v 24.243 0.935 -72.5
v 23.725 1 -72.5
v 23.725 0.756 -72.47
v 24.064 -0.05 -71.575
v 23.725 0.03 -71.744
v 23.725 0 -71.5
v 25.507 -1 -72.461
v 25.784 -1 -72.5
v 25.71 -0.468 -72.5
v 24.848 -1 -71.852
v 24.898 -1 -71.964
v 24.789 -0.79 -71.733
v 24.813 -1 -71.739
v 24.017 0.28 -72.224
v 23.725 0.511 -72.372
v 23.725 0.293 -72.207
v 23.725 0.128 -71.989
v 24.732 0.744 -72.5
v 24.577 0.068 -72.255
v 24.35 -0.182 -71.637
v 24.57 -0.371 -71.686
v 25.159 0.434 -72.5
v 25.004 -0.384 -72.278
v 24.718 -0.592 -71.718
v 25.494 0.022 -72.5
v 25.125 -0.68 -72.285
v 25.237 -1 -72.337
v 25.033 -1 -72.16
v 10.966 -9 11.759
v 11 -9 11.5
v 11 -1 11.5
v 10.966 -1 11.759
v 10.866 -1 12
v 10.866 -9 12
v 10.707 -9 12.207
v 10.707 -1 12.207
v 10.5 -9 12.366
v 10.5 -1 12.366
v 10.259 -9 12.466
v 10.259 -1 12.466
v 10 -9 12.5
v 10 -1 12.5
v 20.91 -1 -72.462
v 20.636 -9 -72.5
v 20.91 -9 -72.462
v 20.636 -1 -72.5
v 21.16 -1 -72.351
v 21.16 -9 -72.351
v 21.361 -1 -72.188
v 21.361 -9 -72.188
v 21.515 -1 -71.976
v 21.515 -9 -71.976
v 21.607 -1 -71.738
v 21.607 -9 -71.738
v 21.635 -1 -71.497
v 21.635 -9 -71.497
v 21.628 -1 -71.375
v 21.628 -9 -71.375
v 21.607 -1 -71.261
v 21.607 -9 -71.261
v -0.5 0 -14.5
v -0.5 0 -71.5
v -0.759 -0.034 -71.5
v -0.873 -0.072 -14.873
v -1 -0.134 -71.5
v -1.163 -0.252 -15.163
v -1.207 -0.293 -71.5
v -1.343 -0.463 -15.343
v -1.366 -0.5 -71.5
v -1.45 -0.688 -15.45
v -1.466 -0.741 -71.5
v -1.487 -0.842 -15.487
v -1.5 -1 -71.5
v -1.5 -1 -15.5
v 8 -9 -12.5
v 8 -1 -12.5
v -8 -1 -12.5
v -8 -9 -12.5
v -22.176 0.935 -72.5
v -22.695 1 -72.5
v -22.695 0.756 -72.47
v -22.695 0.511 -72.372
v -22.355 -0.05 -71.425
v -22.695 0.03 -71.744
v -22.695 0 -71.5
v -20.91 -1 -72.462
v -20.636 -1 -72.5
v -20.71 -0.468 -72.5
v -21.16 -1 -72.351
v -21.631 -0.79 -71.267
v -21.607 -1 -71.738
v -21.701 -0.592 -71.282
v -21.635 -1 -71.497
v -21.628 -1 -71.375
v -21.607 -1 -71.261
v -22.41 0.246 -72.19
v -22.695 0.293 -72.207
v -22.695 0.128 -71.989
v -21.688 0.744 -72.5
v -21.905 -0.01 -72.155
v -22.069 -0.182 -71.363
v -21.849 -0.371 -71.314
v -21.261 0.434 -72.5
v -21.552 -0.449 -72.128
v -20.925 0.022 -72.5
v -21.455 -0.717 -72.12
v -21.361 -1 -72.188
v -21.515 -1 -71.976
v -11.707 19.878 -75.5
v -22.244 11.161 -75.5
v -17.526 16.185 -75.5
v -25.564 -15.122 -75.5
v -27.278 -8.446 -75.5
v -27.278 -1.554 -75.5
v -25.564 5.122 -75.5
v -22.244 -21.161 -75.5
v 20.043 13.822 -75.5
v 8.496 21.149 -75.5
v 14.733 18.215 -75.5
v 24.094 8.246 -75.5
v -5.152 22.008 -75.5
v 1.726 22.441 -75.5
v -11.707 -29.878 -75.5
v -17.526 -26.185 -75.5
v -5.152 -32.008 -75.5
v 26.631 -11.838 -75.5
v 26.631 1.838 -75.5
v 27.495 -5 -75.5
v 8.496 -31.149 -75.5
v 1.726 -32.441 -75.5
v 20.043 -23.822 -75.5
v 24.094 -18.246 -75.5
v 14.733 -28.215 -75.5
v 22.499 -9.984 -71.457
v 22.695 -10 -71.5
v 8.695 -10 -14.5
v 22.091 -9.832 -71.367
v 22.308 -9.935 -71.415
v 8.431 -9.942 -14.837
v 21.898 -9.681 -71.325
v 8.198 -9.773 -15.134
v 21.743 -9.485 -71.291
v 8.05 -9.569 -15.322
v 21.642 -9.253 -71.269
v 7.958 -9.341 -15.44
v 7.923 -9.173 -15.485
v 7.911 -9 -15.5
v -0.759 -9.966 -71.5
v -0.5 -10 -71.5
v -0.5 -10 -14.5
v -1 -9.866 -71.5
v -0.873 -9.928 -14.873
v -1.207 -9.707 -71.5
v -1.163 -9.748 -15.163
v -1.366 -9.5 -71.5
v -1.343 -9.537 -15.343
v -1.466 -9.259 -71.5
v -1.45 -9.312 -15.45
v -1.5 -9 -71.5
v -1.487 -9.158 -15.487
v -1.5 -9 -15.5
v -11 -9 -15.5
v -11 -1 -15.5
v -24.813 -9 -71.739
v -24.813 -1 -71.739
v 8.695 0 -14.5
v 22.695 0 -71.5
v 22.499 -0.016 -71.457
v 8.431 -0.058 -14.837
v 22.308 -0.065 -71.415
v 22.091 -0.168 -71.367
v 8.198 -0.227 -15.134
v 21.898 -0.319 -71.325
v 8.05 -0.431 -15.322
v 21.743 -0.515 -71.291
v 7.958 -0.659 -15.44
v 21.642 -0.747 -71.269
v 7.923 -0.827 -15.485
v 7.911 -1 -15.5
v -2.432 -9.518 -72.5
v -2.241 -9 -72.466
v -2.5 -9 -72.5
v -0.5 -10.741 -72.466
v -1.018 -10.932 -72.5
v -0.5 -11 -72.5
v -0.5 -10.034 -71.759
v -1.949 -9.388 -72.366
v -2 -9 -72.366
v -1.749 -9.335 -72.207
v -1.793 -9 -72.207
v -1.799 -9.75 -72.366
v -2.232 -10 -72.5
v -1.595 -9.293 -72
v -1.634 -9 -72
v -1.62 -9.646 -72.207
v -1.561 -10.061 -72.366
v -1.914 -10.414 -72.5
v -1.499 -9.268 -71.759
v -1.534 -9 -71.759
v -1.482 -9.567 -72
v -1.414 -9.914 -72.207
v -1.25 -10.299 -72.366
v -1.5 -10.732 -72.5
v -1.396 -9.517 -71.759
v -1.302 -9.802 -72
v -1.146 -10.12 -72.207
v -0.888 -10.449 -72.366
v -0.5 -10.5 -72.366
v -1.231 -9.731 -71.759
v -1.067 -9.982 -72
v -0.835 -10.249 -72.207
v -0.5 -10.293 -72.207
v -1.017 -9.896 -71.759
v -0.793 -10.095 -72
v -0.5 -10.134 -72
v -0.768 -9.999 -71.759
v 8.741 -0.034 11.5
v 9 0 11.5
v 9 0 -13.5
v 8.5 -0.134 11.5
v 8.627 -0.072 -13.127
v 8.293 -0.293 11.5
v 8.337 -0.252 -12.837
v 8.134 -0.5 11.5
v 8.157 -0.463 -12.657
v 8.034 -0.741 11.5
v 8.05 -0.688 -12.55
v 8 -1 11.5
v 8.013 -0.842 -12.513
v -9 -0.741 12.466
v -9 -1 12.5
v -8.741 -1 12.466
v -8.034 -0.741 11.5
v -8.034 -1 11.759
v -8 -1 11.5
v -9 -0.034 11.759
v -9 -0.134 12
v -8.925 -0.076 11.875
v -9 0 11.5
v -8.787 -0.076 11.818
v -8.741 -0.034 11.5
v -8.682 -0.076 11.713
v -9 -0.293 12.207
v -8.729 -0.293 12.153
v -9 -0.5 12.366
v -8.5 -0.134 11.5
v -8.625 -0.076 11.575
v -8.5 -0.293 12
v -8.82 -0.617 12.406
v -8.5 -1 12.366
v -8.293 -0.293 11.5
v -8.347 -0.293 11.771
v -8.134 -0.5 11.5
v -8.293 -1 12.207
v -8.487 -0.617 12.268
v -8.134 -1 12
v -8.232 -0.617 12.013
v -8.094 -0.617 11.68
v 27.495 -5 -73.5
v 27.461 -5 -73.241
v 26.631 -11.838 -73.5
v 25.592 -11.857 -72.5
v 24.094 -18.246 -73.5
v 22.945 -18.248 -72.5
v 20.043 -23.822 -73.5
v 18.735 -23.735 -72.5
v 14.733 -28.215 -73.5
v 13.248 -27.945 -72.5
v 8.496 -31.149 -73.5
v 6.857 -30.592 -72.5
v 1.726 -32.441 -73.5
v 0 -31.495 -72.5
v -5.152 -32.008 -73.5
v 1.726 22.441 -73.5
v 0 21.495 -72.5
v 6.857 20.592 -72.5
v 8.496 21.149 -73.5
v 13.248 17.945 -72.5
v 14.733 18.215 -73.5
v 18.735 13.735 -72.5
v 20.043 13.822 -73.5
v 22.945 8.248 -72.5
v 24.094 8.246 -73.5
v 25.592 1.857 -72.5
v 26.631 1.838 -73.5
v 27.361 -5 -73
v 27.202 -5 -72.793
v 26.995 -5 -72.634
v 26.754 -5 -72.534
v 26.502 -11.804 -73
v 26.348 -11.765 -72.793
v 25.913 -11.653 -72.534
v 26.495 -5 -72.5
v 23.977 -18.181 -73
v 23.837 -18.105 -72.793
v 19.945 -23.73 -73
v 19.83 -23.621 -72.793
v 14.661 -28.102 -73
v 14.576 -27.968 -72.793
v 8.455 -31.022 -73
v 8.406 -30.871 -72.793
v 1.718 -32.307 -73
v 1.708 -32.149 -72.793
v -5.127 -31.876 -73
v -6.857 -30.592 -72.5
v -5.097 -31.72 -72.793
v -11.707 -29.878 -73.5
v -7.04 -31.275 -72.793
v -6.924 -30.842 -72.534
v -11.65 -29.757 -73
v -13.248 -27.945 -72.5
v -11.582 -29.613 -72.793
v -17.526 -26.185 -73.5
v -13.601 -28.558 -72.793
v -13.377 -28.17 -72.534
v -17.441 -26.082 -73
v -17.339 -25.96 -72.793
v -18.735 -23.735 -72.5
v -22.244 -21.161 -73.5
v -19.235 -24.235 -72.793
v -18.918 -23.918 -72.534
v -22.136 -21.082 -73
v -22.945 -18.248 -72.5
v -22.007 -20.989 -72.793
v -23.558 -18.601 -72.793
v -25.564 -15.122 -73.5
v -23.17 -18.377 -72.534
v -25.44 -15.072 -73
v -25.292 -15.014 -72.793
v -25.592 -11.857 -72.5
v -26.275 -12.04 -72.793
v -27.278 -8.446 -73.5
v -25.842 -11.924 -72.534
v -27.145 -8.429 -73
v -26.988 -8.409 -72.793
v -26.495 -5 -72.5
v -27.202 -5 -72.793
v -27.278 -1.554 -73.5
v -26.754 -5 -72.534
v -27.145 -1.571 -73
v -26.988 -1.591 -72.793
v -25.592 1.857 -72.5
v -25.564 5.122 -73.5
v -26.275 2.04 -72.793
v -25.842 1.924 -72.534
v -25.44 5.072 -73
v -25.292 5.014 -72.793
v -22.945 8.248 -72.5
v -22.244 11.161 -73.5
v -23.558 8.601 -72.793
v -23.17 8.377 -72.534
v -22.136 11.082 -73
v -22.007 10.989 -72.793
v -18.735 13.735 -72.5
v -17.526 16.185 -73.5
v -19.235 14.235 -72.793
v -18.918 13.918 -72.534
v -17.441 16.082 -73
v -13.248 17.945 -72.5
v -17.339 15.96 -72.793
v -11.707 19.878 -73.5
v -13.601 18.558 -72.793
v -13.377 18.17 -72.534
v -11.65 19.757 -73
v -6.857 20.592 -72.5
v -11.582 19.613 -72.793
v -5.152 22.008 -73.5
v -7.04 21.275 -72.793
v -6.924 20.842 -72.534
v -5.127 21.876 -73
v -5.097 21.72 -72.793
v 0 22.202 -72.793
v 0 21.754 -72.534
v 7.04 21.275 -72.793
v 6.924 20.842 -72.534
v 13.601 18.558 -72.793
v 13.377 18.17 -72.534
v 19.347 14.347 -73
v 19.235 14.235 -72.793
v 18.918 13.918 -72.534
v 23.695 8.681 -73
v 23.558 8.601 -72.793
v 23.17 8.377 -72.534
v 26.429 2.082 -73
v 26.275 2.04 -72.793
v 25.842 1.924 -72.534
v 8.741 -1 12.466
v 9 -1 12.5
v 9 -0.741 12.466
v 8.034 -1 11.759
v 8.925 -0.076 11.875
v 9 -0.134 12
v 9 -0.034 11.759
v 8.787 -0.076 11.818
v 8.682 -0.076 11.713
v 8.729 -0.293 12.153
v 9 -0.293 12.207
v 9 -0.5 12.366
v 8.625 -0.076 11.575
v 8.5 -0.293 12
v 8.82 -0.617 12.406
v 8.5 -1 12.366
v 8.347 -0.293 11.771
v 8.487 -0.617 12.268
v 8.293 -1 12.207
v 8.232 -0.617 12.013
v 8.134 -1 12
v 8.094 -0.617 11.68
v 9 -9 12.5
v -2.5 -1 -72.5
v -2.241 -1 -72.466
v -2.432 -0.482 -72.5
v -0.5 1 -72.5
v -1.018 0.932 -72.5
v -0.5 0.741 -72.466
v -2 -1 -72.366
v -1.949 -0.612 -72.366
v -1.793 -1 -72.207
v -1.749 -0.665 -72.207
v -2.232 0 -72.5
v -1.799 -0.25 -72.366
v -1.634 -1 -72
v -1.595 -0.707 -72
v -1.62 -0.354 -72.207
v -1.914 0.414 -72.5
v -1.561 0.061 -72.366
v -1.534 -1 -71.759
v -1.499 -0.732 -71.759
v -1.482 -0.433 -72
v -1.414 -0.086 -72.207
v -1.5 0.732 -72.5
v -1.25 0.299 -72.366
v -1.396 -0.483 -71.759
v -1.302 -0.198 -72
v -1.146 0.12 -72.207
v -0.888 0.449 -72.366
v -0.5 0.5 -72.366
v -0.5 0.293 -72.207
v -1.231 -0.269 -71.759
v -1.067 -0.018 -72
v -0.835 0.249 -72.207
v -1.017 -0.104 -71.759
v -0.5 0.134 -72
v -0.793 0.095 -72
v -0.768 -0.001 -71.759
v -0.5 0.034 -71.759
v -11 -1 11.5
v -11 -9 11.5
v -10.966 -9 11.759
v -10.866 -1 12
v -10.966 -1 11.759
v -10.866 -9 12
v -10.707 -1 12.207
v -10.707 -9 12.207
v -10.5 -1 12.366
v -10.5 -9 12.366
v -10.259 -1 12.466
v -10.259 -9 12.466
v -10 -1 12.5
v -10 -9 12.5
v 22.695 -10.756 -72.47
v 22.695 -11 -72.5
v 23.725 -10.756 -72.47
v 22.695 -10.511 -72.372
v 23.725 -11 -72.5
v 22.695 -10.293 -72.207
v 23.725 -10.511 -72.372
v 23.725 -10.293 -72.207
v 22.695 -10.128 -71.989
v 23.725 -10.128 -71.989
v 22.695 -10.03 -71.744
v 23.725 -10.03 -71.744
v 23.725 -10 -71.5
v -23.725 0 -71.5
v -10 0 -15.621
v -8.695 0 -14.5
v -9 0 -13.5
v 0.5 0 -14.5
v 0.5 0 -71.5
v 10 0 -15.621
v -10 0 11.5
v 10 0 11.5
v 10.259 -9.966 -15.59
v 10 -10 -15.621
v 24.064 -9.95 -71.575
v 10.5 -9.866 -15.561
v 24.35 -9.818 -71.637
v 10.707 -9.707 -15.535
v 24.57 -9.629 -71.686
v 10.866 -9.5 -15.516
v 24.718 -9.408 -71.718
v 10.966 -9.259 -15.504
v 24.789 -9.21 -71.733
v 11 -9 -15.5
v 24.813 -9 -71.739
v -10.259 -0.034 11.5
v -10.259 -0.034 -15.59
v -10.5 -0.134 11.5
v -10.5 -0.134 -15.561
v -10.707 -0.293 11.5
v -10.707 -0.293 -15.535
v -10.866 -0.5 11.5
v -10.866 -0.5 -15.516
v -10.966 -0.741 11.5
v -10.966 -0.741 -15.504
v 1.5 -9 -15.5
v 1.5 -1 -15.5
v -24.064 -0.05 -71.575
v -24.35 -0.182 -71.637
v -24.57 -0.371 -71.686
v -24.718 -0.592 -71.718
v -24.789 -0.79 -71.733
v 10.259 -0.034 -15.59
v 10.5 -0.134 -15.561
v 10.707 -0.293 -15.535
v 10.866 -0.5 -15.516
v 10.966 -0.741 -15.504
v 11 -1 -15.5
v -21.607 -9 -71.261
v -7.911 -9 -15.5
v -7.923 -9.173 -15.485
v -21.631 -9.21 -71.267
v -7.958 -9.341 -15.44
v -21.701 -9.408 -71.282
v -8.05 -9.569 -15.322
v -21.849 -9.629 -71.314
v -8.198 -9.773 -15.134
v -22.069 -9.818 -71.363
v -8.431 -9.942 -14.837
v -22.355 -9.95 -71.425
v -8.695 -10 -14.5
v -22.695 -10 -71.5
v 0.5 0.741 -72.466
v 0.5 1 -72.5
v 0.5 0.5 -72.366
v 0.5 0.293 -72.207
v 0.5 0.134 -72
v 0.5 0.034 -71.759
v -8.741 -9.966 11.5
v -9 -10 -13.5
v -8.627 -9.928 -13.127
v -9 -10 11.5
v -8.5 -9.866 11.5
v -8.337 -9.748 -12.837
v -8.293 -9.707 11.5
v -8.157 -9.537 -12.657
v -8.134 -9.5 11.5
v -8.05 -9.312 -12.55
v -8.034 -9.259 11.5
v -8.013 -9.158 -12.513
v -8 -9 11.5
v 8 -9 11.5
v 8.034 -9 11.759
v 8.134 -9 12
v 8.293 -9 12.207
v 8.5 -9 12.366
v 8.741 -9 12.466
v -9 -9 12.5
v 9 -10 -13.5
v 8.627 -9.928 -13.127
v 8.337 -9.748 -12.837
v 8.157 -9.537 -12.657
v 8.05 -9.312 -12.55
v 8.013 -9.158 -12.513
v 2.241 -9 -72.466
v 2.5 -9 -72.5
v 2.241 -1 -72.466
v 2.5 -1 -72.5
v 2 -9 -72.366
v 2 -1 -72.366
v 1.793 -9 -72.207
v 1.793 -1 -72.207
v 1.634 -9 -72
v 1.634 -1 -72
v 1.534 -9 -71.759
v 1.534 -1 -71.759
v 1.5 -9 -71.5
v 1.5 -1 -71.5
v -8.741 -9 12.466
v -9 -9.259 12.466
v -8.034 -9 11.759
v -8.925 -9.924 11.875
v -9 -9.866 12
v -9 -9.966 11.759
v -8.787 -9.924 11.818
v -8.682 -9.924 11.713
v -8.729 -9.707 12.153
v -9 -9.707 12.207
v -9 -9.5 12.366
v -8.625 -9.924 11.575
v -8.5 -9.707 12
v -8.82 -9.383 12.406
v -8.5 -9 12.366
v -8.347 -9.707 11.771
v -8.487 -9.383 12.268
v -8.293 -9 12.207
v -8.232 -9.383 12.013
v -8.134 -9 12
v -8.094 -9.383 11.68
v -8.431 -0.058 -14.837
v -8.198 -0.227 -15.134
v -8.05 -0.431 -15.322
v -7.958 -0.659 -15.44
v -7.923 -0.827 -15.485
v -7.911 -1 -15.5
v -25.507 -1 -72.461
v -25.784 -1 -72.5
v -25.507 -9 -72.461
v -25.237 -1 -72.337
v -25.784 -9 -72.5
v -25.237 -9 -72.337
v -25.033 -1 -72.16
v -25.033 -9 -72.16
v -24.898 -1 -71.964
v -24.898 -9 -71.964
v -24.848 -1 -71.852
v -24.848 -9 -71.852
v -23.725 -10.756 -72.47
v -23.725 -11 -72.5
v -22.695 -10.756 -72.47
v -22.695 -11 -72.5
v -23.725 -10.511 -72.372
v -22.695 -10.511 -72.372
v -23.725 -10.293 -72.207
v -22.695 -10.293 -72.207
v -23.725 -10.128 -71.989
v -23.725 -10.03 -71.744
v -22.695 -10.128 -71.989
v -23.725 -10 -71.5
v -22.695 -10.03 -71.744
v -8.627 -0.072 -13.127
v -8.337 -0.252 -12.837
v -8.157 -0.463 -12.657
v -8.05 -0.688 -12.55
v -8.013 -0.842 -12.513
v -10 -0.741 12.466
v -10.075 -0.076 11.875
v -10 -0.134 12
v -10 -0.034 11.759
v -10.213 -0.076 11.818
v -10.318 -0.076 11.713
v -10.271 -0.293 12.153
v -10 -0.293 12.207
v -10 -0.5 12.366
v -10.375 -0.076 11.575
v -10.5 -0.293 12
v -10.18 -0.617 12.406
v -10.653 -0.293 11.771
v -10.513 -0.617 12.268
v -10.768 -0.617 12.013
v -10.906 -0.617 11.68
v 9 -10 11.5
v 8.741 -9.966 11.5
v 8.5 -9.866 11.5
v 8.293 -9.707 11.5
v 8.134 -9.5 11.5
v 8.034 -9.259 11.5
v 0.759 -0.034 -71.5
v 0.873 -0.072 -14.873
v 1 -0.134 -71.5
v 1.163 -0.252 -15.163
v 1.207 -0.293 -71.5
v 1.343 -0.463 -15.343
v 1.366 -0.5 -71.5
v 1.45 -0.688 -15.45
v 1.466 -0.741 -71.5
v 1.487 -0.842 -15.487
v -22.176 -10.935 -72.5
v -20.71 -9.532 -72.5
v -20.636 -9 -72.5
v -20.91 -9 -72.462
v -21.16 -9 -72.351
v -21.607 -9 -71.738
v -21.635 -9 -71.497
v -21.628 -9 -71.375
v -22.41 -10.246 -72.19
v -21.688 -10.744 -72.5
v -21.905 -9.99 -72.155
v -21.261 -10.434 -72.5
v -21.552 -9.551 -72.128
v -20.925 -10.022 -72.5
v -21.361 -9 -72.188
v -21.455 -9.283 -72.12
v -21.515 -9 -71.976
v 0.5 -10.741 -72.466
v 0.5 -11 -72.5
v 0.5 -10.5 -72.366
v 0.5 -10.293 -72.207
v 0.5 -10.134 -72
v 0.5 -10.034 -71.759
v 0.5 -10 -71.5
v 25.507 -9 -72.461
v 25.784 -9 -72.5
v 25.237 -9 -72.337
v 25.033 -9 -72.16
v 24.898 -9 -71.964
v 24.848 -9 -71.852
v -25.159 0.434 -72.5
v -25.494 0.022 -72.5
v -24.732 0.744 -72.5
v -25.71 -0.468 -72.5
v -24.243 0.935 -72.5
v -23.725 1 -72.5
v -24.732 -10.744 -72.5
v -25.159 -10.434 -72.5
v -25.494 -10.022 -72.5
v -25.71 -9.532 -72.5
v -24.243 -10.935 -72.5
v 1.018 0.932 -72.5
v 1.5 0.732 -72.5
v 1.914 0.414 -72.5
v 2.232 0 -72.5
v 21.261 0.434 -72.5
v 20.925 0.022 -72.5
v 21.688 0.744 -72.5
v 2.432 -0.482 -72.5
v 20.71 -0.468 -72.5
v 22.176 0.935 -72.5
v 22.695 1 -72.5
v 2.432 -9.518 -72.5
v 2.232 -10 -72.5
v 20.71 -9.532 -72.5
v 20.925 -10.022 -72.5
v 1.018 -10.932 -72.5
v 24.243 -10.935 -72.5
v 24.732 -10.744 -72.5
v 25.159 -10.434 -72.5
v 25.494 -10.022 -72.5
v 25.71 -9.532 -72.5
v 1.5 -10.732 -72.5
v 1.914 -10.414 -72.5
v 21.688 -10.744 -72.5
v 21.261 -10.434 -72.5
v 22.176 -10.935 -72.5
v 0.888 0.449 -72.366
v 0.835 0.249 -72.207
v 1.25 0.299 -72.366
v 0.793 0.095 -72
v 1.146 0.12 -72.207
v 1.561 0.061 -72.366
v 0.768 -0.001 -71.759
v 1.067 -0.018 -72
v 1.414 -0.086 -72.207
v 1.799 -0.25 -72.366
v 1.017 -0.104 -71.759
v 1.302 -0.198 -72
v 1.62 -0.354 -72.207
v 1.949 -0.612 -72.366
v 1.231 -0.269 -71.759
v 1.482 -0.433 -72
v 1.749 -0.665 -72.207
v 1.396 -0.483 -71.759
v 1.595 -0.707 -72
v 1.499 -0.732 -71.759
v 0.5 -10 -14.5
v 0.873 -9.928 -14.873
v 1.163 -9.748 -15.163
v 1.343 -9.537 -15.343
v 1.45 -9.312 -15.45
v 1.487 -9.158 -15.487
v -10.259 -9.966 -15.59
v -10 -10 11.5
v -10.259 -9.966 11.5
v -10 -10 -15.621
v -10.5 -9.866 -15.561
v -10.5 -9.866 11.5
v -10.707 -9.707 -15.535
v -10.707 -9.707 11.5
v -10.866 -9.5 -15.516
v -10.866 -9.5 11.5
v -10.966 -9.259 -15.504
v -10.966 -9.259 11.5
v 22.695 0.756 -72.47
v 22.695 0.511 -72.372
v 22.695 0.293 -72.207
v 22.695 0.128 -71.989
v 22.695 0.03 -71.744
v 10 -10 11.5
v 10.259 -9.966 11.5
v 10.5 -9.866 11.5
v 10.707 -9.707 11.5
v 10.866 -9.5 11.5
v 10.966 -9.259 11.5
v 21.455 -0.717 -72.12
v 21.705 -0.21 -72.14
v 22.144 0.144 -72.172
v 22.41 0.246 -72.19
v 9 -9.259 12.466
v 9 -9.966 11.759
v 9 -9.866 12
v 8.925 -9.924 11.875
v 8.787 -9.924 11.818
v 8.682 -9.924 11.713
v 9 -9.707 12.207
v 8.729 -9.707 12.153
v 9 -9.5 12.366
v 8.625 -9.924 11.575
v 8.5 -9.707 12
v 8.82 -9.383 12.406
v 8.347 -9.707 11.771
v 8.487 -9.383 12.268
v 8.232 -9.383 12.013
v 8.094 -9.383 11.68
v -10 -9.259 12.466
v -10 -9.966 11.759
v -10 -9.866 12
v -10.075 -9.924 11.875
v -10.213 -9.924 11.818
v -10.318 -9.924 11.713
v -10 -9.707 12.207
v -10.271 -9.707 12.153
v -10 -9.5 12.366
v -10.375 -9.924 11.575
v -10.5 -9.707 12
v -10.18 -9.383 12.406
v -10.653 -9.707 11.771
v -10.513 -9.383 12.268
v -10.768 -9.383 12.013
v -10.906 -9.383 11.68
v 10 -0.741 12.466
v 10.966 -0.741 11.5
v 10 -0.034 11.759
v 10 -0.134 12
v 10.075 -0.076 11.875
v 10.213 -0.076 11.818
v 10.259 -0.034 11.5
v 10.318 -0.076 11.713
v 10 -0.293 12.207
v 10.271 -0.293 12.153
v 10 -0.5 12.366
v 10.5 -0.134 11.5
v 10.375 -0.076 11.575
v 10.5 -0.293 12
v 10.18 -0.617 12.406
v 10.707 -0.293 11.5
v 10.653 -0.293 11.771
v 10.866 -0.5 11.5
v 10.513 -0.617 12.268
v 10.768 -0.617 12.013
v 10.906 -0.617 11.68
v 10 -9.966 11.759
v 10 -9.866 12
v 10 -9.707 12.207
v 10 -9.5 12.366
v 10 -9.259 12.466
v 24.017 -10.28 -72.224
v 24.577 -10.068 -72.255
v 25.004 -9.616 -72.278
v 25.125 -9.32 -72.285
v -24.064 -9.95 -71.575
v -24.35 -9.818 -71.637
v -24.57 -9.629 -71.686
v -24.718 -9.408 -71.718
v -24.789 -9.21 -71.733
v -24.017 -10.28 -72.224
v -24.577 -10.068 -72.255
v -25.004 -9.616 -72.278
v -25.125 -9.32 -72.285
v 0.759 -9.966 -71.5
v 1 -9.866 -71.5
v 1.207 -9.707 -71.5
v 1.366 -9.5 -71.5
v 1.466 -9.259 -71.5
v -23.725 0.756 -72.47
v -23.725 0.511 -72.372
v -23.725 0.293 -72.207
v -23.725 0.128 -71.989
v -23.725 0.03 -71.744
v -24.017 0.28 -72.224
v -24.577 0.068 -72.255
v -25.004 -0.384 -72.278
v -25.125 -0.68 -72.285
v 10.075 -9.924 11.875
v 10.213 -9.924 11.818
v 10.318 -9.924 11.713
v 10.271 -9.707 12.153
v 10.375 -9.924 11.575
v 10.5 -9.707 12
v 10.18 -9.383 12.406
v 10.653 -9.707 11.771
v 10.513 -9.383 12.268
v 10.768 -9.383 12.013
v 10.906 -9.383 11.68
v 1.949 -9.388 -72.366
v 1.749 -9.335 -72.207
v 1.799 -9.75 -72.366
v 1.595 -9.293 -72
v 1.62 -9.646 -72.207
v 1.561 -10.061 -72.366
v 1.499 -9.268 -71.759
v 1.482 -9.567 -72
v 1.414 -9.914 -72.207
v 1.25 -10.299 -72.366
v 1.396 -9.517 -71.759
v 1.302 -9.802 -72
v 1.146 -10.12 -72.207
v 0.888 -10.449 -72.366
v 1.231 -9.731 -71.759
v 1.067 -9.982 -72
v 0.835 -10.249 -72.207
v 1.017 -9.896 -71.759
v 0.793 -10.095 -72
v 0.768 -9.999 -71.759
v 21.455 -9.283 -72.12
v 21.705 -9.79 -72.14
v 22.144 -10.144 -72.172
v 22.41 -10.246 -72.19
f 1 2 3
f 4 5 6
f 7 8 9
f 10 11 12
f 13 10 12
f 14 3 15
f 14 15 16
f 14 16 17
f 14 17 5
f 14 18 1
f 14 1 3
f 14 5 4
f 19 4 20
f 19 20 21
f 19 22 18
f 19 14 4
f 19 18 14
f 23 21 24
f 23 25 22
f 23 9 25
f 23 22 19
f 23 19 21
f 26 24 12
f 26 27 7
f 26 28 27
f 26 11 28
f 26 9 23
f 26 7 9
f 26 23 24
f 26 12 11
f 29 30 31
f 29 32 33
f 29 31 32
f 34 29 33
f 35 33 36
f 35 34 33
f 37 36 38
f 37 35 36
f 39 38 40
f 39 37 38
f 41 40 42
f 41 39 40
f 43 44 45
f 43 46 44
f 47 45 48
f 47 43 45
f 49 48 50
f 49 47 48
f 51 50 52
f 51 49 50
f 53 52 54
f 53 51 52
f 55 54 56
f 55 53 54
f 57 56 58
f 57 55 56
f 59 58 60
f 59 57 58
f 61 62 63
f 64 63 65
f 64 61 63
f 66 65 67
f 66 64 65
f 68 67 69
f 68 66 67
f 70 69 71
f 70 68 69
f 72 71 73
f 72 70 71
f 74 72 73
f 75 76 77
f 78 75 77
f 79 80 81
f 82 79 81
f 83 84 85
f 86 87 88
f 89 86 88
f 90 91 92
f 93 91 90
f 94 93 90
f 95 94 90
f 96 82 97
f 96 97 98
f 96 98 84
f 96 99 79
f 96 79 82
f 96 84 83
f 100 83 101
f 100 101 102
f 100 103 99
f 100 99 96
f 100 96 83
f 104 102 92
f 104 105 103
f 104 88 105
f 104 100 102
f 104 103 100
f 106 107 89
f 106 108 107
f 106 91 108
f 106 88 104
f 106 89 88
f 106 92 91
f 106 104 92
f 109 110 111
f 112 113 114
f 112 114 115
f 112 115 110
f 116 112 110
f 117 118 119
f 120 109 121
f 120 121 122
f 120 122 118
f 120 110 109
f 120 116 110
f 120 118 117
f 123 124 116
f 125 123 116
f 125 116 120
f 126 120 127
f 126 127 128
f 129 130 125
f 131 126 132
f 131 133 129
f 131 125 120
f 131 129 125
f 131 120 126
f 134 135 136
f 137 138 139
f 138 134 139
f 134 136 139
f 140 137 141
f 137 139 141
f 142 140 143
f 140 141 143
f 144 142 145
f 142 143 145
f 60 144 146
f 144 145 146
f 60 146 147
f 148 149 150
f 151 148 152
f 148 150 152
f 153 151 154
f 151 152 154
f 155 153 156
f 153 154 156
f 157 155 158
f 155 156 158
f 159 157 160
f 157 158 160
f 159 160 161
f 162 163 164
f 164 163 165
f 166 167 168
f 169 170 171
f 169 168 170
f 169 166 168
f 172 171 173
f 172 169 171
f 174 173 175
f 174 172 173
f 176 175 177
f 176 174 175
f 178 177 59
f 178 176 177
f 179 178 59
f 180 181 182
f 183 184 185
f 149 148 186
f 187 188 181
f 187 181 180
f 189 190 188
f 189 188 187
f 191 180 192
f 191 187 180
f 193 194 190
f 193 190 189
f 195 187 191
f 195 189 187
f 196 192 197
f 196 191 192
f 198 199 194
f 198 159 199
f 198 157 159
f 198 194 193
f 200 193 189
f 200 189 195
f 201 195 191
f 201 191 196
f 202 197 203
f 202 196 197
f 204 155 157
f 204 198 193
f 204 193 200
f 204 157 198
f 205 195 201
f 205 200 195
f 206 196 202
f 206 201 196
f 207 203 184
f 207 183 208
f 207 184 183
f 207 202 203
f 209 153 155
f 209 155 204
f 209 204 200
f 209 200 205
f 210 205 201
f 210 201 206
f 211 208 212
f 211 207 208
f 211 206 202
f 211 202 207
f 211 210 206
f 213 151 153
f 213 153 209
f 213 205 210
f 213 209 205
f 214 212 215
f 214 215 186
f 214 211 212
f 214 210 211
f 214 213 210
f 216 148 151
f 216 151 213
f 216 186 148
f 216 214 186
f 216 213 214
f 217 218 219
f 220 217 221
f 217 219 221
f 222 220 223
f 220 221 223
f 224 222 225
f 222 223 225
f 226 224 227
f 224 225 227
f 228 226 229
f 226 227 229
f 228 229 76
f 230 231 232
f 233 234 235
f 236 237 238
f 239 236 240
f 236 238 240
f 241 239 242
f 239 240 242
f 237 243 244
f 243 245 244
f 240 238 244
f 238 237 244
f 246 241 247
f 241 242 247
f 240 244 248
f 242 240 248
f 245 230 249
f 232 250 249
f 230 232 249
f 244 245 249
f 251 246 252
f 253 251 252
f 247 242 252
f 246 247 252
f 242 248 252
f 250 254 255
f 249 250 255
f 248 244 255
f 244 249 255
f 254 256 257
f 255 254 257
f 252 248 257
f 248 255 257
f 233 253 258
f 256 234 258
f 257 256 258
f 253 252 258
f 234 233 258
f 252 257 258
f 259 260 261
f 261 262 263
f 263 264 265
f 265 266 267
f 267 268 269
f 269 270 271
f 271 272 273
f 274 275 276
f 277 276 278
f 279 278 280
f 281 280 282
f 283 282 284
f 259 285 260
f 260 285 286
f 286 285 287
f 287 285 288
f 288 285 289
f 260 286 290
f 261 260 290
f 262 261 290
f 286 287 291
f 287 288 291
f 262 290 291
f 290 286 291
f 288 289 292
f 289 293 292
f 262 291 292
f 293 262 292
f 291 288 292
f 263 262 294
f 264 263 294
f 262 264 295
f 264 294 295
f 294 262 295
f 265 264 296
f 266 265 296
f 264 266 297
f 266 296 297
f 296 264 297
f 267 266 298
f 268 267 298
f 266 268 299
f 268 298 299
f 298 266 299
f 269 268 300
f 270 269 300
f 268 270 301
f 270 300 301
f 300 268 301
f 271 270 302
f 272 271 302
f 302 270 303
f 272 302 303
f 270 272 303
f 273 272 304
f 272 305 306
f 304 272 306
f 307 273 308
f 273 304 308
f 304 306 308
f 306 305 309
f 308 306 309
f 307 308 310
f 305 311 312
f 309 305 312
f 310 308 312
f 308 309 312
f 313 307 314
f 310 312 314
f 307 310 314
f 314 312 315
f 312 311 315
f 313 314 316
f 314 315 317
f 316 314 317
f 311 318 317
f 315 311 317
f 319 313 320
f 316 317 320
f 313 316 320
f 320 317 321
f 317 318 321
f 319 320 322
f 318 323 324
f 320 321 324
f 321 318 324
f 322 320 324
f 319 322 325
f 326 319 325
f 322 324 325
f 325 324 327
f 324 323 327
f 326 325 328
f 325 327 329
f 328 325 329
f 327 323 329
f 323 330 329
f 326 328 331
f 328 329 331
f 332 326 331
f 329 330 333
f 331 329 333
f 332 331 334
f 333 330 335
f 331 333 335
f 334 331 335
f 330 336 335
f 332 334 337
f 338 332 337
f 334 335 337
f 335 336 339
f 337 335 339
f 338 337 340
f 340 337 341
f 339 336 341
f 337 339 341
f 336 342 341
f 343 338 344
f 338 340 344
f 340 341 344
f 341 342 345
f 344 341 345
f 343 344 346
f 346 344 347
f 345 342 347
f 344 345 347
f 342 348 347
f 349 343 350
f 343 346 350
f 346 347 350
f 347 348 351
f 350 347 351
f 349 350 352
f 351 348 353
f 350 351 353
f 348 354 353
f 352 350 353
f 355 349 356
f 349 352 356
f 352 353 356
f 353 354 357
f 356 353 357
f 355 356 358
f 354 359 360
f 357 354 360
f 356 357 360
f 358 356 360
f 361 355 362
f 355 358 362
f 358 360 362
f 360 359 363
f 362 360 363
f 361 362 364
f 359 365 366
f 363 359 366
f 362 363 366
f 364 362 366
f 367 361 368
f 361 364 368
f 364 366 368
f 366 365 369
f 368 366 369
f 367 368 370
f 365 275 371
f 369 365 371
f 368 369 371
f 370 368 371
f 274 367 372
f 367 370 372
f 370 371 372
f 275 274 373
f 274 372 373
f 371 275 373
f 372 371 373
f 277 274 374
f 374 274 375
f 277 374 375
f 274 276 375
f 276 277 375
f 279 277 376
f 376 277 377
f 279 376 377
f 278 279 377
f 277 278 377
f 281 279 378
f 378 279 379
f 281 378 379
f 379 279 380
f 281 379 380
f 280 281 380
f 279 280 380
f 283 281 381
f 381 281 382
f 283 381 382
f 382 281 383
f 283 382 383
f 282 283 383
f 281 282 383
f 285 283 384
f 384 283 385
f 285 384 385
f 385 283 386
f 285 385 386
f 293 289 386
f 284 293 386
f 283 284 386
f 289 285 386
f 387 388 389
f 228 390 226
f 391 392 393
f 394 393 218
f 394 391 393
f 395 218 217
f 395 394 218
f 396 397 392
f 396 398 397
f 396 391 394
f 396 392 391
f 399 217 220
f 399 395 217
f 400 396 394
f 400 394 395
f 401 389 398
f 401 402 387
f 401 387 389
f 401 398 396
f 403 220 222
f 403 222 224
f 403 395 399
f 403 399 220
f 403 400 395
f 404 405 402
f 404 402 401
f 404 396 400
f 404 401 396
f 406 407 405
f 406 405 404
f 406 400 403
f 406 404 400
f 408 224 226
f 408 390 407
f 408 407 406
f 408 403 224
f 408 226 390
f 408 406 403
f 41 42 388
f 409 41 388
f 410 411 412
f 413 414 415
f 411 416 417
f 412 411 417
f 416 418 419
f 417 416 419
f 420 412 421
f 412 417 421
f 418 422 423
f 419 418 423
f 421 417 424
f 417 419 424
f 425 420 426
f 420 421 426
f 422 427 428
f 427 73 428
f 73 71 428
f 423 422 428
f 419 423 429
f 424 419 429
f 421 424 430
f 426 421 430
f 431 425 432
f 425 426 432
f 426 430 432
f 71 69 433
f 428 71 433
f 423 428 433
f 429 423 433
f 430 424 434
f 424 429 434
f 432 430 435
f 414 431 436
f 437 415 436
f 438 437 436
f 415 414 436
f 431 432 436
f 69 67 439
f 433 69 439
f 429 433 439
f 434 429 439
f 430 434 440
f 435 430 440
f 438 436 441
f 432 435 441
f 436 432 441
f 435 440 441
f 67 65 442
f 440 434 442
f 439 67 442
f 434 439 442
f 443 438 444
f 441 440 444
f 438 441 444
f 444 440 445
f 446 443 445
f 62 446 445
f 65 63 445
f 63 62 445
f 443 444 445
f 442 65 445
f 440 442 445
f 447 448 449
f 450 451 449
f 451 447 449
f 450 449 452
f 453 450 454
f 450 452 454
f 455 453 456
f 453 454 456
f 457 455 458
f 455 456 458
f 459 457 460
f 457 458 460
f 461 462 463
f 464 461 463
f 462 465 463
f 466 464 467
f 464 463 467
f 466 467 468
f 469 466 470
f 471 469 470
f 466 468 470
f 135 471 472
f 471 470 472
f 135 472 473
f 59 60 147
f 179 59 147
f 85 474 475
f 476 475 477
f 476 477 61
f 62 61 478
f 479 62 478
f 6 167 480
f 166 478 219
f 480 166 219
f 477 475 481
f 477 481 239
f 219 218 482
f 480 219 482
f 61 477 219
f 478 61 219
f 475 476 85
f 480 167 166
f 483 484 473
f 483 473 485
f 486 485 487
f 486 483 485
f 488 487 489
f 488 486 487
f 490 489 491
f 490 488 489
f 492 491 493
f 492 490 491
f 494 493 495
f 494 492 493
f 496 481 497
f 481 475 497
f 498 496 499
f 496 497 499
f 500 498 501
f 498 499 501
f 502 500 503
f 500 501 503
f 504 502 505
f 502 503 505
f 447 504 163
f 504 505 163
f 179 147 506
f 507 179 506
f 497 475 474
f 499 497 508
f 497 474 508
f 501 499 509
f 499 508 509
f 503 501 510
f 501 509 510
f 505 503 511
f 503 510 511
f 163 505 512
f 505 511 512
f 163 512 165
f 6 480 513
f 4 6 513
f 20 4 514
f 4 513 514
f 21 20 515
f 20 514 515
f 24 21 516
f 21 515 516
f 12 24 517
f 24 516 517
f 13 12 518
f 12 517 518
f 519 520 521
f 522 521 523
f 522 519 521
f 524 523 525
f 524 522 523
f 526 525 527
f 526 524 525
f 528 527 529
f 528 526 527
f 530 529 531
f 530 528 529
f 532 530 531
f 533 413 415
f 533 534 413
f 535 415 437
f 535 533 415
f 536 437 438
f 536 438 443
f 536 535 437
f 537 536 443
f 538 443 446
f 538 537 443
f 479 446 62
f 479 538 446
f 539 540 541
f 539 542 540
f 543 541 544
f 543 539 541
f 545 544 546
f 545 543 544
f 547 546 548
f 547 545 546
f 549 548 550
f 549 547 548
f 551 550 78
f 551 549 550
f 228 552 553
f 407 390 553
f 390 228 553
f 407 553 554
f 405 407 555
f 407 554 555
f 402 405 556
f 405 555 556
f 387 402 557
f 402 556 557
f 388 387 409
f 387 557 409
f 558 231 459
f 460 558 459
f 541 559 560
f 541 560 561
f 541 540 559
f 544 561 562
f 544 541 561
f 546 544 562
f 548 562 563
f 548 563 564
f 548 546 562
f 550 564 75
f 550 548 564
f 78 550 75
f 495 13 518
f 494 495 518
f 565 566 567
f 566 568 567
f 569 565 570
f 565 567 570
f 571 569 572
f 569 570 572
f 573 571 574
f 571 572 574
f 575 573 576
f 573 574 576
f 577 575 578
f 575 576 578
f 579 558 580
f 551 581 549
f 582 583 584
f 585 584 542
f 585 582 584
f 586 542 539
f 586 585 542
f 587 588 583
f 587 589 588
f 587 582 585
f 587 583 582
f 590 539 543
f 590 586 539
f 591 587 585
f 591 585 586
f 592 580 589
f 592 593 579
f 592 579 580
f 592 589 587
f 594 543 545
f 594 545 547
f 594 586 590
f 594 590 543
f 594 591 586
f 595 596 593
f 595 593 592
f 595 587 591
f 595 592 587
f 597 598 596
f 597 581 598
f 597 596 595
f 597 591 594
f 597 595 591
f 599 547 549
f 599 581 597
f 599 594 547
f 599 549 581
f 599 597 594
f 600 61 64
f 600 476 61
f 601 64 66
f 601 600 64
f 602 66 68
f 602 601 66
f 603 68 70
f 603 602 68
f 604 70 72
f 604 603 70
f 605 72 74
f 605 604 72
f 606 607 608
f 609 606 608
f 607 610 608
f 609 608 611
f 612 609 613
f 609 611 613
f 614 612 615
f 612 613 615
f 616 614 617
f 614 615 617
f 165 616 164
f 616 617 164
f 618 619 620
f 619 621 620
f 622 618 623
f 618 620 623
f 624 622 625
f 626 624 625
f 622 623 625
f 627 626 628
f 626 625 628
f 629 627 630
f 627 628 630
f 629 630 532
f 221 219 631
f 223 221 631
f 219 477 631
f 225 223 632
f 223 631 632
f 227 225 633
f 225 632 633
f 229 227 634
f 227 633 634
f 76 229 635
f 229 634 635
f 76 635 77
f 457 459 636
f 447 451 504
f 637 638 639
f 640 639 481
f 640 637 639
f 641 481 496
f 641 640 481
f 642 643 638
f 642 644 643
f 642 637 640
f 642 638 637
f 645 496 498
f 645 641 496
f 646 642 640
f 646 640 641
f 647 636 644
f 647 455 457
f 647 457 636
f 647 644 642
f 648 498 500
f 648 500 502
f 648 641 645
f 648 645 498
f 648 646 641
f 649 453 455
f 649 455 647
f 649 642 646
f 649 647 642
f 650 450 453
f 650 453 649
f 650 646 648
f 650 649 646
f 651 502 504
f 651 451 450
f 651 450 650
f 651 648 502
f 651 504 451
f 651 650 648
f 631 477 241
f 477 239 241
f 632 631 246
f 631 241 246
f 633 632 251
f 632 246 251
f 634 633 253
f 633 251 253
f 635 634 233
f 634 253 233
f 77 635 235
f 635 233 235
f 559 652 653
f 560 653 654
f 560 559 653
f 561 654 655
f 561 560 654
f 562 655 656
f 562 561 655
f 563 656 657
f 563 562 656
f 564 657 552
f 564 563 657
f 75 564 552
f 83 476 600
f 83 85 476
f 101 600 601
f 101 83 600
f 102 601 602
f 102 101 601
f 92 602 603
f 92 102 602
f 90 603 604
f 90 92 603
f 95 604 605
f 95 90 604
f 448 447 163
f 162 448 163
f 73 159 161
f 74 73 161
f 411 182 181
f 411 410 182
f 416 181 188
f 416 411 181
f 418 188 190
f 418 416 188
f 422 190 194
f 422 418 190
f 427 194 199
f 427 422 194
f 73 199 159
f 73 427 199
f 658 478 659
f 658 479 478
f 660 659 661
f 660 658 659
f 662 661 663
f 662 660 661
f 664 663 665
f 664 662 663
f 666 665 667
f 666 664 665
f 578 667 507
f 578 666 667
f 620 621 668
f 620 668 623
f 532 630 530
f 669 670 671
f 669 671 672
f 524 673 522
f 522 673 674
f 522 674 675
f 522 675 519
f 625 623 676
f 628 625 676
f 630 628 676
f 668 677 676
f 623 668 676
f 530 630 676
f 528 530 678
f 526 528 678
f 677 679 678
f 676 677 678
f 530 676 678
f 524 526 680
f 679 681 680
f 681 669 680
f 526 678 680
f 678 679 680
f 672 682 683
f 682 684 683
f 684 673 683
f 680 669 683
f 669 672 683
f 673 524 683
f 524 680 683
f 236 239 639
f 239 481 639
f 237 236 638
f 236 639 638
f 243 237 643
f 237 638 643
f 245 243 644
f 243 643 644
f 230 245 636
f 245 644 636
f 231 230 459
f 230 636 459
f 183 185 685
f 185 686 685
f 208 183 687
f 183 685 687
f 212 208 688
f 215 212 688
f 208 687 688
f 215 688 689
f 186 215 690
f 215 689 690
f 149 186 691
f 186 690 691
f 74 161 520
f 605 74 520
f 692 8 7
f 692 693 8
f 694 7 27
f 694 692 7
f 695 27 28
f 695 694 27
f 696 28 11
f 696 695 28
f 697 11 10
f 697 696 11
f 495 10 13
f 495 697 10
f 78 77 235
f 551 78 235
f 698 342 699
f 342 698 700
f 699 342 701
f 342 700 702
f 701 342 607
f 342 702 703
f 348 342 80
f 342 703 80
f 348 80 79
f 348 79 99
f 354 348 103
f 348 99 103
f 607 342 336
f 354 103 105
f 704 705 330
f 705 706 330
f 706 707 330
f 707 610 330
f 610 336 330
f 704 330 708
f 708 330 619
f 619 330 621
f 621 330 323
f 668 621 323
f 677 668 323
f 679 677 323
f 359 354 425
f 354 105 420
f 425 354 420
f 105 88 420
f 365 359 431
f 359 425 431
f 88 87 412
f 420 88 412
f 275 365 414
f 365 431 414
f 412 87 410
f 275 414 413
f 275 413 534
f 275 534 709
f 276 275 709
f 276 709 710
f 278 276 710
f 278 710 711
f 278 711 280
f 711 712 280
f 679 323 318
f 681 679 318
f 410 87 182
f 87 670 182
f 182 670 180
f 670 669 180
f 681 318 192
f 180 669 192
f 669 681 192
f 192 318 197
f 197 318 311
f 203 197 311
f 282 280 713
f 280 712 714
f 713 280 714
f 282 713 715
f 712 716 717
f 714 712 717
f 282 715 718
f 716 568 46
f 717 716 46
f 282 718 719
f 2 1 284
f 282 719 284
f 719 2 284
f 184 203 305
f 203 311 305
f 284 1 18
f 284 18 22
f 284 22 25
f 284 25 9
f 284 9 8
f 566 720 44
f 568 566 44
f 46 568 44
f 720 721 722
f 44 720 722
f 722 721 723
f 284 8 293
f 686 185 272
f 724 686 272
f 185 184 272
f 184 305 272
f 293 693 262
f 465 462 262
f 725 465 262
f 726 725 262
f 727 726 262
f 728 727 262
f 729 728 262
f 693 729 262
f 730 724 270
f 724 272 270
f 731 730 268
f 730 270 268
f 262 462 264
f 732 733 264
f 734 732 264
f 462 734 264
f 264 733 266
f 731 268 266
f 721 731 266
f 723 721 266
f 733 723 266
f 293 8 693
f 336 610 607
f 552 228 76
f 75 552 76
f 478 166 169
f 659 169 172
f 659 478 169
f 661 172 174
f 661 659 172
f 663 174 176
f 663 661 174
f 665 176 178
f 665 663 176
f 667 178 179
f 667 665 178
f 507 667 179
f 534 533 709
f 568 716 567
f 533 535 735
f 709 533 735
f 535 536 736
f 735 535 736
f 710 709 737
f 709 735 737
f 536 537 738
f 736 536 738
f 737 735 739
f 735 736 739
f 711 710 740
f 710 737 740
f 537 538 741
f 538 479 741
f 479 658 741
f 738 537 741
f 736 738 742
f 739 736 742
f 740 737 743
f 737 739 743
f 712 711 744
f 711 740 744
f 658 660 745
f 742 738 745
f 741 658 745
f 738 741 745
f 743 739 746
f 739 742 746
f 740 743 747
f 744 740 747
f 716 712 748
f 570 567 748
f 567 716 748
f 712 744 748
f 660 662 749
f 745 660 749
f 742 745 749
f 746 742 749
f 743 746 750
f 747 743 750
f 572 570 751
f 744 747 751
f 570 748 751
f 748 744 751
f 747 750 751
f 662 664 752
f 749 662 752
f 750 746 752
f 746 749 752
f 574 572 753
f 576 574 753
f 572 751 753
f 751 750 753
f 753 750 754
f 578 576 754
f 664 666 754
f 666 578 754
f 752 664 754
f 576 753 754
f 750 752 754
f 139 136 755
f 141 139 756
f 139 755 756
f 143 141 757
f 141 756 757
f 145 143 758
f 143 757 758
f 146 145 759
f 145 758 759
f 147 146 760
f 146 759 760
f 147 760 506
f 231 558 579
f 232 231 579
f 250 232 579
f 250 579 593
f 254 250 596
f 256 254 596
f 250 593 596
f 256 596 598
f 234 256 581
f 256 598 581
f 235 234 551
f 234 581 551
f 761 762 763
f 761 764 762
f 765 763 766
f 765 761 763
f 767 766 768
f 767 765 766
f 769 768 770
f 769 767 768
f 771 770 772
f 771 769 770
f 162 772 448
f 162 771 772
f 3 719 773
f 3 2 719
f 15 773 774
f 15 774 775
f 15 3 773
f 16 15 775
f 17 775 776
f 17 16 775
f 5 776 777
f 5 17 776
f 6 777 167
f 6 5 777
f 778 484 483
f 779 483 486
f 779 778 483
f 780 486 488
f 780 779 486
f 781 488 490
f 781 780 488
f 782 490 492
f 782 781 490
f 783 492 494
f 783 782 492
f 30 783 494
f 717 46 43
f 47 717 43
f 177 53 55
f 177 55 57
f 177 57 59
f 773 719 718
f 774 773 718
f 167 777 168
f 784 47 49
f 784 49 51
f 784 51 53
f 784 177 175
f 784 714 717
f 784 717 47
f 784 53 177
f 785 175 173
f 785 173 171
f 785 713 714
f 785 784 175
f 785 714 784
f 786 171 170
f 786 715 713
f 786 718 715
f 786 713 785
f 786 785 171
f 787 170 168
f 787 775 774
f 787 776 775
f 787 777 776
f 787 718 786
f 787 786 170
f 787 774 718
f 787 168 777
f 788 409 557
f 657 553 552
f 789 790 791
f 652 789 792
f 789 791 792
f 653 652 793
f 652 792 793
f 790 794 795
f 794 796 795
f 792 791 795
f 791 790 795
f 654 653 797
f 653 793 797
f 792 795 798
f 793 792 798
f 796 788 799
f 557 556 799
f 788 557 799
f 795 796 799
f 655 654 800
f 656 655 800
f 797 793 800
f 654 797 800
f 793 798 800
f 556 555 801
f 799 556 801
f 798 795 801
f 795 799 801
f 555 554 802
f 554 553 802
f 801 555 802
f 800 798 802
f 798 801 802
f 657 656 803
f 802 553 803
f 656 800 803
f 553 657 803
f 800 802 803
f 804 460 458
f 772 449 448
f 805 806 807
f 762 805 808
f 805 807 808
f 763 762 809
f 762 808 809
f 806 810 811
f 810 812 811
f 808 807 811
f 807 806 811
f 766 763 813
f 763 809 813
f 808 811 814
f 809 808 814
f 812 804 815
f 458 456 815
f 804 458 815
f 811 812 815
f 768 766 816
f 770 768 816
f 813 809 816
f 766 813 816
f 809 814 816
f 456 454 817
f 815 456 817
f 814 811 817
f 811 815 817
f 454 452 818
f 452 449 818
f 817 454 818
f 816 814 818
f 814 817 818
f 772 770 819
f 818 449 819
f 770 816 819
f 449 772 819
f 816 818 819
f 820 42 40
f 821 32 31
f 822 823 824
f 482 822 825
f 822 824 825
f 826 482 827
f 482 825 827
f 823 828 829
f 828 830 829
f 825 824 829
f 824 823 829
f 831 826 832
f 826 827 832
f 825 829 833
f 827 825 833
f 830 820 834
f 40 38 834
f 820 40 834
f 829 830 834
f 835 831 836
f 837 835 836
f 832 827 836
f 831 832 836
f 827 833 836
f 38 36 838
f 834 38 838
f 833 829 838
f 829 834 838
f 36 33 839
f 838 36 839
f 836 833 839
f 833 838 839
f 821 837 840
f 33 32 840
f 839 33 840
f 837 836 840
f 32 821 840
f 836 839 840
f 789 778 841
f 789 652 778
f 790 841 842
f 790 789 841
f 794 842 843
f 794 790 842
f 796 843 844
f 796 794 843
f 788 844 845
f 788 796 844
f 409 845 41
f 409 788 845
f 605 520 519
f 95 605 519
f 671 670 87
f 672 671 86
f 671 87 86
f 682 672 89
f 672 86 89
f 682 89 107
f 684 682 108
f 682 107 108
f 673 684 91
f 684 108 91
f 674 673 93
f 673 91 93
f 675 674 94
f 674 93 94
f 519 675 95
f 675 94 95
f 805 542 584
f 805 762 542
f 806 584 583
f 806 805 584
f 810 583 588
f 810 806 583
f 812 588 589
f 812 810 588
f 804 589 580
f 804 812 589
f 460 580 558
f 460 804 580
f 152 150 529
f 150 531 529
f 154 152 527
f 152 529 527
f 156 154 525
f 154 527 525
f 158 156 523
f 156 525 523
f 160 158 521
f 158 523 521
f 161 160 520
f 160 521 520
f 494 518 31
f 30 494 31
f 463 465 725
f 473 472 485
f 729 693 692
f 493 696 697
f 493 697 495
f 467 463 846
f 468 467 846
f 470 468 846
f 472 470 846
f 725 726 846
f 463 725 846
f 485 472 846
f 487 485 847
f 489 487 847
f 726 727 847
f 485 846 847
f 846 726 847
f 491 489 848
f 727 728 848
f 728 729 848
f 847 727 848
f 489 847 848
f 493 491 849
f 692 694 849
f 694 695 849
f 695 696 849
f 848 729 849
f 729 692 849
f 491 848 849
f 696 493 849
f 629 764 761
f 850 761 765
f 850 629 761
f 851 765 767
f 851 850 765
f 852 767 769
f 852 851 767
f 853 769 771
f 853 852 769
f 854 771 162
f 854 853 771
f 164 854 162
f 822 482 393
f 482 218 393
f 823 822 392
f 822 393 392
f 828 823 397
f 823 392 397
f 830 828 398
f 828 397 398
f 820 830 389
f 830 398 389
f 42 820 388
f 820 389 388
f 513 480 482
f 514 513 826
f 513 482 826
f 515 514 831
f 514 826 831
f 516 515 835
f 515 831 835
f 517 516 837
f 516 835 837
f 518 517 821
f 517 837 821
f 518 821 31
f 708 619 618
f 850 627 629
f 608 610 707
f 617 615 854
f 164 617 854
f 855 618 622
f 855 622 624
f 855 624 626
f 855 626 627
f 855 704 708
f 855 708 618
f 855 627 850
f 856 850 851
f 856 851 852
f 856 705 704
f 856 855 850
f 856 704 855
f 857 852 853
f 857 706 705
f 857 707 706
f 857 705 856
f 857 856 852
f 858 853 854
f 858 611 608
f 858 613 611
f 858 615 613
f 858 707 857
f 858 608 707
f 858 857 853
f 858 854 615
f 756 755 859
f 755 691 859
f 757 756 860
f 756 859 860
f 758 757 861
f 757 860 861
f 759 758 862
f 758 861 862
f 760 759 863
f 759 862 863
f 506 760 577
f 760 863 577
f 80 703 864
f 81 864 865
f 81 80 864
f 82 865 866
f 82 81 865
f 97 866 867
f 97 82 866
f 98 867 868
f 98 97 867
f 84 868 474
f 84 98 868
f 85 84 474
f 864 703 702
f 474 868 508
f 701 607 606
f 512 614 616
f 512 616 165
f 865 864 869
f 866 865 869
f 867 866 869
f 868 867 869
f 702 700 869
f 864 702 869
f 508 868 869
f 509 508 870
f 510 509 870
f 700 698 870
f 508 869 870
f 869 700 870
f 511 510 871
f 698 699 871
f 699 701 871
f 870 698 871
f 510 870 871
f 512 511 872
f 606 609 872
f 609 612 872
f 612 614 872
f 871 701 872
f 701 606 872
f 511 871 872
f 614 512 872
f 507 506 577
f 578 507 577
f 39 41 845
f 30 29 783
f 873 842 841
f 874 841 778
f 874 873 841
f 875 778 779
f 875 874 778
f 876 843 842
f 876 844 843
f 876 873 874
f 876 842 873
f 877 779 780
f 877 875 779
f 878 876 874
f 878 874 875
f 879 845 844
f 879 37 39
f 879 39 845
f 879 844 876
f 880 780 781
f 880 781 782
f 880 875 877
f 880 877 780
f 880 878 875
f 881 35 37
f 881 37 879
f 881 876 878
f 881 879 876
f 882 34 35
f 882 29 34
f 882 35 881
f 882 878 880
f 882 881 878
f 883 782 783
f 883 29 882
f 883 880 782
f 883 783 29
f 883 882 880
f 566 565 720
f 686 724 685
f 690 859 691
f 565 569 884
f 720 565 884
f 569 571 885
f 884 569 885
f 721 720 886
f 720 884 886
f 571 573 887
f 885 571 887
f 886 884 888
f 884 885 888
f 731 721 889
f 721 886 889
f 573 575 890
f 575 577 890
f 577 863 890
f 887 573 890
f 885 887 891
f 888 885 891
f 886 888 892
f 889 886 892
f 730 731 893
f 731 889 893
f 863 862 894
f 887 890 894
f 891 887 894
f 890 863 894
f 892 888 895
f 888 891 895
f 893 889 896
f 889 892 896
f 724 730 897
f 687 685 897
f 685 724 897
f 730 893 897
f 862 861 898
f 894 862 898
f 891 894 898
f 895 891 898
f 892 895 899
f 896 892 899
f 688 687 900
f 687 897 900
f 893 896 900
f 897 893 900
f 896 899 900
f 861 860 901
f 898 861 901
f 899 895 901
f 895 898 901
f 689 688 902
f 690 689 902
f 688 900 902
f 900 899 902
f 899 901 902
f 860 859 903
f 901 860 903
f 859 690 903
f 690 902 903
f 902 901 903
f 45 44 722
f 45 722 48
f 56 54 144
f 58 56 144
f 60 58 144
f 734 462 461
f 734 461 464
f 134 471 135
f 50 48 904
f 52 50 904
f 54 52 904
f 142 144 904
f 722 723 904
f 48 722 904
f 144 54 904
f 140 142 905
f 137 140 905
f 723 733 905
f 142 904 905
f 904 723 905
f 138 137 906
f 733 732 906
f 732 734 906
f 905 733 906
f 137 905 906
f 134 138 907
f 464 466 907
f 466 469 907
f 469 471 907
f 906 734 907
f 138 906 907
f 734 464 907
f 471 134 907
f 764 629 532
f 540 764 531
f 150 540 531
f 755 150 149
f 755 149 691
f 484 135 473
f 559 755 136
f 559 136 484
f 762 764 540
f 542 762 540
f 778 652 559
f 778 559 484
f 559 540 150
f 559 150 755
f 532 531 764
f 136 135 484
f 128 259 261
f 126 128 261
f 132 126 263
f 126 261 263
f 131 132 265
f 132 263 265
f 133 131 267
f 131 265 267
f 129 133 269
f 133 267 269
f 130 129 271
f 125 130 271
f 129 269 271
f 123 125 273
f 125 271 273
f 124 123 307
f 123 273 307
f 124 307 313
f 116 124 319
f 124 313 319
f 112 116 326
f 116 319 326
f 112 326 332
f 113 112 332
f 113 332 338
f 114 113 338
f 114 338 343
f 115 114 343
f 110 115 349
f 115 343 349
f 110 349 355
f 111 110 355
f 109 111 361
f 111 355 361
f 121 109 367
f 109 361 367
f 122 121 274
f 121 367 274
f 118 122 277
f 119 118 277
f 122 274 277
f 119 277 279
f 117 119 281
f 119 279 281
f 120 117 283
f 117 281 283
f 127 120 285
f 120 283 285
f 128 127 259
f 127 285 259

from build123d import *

# Parameters (mm, degrees)
F1_DEPTH = 10
F3_DEPTH = 25
F4_R     = 27.495097568
F5_DEPTH = 3
F6_R     = 1


# Not quite as in the source:
# - a feature names something its author has since deleted; it is built from what else it names


with BuildPart() as f1:
    # F0 (on Front) → F1 (new body)
    with BuildSketch(Plane.XZ):
        Polygon((11, 12.5), (8, 12.5), (8, -12.5), (-8, -12.5), (-8, 12.5), (-11, 12.5), (-11, -15.5), (11, -15.5), align=None)
        Polygon((25, -72.5), (11, -15.5), (-11, -15.5), (-25, -72.5), align=None)
    extrude(amount=F1_DEPTH)

    # F2 (on face) → F3 (cut)
    with BuildSketch(Plane.XZ.offset(10)):
        Polygon((-1.5, -15.5), (-7.9108356651, -15.5), (-21.9108356651, -72.5), (-1.5, -72.5), align=None)
        Polygon((1.5, -15.5), (1.5, -72.5), (21.9108356651, -72.5), (7.9108356651, -15.5), align=None)
    extrude(amount=-F3_DEPTH, mode=Mode.SUBTRACT)

    # F4 (on face) → F5 (join)
    with BuildSketch(Plane(origin=(0, 0, -72.5), x_dir=(1, 0, 0), z_dir=(0, 0, -1))):
        with Locations((0, 5)):
            Circle(F4_R)
    extrude(amount=F5_DEPTH)

    # F6
    f6_edges = [f1.edges().sort_by_distance(p)[0] for p in [
        (-8, -5, 12.5),
        (8, -5, 12.5),
        (11, -5, 12.5),
        (-11, -5, 12.5),
        (9.5, -10, 12.5),
        (-9.5, -10, 12.5),
        (9.5, 0, 12.5),
        (-9.5, 0, 12.5),
        (-11, 0, -1.5),
        (11, 0, -1.5),
        (11, -10, -1.5),
        (-11, -10, -1.5),
        (-18, -10, -44),
        (18, -10, -44),
        (-18, 0, -44),
        (18, 0, -44),
        (0, -10, -72.5),
        (23.455418, -10, -72.5),
        (14.910836, -10, -44),
        (4.705418, -10, -15.5),
        (1.5, -10, -44),
        (-1.5, -10, -44),
        (-4.705418, -10, -15.5),
        (-14.910836, -10, -44),
        (-23.455418, -10, -72.5),
        (-8, -10, 0),
        (0, -10, -12.5),
        (8, -10, 0),
        (23.455418, 0, -72.5),
        (14.910836, 0, -44),
        (4.705418, 0, -15.5),
        (1.5, 0, -44),
        (0, 0, -72.5),
        (-1.5, 0, -44),
        (-4.705418, 0, -15.5),
        (-14.910836, 0, -44),
        (-23.455418, 0, -72.5),
        (-8, 0, 0),
        (0, 0, -12.5),
        (8, 0, 0),
        (-27.495098, -5, -72.5),
        (-21.910836, -5, -72.5),
        (-25, -5, -72.5),
        (1.5, -5, -72.5),
        (-1.5, -5, -72.5),
        (25, -5, -72.5),
        (21.910836, -5, -72.5),
    ]]
    fillet(f6_edges, radius=F6_R)


solid = f1.part
